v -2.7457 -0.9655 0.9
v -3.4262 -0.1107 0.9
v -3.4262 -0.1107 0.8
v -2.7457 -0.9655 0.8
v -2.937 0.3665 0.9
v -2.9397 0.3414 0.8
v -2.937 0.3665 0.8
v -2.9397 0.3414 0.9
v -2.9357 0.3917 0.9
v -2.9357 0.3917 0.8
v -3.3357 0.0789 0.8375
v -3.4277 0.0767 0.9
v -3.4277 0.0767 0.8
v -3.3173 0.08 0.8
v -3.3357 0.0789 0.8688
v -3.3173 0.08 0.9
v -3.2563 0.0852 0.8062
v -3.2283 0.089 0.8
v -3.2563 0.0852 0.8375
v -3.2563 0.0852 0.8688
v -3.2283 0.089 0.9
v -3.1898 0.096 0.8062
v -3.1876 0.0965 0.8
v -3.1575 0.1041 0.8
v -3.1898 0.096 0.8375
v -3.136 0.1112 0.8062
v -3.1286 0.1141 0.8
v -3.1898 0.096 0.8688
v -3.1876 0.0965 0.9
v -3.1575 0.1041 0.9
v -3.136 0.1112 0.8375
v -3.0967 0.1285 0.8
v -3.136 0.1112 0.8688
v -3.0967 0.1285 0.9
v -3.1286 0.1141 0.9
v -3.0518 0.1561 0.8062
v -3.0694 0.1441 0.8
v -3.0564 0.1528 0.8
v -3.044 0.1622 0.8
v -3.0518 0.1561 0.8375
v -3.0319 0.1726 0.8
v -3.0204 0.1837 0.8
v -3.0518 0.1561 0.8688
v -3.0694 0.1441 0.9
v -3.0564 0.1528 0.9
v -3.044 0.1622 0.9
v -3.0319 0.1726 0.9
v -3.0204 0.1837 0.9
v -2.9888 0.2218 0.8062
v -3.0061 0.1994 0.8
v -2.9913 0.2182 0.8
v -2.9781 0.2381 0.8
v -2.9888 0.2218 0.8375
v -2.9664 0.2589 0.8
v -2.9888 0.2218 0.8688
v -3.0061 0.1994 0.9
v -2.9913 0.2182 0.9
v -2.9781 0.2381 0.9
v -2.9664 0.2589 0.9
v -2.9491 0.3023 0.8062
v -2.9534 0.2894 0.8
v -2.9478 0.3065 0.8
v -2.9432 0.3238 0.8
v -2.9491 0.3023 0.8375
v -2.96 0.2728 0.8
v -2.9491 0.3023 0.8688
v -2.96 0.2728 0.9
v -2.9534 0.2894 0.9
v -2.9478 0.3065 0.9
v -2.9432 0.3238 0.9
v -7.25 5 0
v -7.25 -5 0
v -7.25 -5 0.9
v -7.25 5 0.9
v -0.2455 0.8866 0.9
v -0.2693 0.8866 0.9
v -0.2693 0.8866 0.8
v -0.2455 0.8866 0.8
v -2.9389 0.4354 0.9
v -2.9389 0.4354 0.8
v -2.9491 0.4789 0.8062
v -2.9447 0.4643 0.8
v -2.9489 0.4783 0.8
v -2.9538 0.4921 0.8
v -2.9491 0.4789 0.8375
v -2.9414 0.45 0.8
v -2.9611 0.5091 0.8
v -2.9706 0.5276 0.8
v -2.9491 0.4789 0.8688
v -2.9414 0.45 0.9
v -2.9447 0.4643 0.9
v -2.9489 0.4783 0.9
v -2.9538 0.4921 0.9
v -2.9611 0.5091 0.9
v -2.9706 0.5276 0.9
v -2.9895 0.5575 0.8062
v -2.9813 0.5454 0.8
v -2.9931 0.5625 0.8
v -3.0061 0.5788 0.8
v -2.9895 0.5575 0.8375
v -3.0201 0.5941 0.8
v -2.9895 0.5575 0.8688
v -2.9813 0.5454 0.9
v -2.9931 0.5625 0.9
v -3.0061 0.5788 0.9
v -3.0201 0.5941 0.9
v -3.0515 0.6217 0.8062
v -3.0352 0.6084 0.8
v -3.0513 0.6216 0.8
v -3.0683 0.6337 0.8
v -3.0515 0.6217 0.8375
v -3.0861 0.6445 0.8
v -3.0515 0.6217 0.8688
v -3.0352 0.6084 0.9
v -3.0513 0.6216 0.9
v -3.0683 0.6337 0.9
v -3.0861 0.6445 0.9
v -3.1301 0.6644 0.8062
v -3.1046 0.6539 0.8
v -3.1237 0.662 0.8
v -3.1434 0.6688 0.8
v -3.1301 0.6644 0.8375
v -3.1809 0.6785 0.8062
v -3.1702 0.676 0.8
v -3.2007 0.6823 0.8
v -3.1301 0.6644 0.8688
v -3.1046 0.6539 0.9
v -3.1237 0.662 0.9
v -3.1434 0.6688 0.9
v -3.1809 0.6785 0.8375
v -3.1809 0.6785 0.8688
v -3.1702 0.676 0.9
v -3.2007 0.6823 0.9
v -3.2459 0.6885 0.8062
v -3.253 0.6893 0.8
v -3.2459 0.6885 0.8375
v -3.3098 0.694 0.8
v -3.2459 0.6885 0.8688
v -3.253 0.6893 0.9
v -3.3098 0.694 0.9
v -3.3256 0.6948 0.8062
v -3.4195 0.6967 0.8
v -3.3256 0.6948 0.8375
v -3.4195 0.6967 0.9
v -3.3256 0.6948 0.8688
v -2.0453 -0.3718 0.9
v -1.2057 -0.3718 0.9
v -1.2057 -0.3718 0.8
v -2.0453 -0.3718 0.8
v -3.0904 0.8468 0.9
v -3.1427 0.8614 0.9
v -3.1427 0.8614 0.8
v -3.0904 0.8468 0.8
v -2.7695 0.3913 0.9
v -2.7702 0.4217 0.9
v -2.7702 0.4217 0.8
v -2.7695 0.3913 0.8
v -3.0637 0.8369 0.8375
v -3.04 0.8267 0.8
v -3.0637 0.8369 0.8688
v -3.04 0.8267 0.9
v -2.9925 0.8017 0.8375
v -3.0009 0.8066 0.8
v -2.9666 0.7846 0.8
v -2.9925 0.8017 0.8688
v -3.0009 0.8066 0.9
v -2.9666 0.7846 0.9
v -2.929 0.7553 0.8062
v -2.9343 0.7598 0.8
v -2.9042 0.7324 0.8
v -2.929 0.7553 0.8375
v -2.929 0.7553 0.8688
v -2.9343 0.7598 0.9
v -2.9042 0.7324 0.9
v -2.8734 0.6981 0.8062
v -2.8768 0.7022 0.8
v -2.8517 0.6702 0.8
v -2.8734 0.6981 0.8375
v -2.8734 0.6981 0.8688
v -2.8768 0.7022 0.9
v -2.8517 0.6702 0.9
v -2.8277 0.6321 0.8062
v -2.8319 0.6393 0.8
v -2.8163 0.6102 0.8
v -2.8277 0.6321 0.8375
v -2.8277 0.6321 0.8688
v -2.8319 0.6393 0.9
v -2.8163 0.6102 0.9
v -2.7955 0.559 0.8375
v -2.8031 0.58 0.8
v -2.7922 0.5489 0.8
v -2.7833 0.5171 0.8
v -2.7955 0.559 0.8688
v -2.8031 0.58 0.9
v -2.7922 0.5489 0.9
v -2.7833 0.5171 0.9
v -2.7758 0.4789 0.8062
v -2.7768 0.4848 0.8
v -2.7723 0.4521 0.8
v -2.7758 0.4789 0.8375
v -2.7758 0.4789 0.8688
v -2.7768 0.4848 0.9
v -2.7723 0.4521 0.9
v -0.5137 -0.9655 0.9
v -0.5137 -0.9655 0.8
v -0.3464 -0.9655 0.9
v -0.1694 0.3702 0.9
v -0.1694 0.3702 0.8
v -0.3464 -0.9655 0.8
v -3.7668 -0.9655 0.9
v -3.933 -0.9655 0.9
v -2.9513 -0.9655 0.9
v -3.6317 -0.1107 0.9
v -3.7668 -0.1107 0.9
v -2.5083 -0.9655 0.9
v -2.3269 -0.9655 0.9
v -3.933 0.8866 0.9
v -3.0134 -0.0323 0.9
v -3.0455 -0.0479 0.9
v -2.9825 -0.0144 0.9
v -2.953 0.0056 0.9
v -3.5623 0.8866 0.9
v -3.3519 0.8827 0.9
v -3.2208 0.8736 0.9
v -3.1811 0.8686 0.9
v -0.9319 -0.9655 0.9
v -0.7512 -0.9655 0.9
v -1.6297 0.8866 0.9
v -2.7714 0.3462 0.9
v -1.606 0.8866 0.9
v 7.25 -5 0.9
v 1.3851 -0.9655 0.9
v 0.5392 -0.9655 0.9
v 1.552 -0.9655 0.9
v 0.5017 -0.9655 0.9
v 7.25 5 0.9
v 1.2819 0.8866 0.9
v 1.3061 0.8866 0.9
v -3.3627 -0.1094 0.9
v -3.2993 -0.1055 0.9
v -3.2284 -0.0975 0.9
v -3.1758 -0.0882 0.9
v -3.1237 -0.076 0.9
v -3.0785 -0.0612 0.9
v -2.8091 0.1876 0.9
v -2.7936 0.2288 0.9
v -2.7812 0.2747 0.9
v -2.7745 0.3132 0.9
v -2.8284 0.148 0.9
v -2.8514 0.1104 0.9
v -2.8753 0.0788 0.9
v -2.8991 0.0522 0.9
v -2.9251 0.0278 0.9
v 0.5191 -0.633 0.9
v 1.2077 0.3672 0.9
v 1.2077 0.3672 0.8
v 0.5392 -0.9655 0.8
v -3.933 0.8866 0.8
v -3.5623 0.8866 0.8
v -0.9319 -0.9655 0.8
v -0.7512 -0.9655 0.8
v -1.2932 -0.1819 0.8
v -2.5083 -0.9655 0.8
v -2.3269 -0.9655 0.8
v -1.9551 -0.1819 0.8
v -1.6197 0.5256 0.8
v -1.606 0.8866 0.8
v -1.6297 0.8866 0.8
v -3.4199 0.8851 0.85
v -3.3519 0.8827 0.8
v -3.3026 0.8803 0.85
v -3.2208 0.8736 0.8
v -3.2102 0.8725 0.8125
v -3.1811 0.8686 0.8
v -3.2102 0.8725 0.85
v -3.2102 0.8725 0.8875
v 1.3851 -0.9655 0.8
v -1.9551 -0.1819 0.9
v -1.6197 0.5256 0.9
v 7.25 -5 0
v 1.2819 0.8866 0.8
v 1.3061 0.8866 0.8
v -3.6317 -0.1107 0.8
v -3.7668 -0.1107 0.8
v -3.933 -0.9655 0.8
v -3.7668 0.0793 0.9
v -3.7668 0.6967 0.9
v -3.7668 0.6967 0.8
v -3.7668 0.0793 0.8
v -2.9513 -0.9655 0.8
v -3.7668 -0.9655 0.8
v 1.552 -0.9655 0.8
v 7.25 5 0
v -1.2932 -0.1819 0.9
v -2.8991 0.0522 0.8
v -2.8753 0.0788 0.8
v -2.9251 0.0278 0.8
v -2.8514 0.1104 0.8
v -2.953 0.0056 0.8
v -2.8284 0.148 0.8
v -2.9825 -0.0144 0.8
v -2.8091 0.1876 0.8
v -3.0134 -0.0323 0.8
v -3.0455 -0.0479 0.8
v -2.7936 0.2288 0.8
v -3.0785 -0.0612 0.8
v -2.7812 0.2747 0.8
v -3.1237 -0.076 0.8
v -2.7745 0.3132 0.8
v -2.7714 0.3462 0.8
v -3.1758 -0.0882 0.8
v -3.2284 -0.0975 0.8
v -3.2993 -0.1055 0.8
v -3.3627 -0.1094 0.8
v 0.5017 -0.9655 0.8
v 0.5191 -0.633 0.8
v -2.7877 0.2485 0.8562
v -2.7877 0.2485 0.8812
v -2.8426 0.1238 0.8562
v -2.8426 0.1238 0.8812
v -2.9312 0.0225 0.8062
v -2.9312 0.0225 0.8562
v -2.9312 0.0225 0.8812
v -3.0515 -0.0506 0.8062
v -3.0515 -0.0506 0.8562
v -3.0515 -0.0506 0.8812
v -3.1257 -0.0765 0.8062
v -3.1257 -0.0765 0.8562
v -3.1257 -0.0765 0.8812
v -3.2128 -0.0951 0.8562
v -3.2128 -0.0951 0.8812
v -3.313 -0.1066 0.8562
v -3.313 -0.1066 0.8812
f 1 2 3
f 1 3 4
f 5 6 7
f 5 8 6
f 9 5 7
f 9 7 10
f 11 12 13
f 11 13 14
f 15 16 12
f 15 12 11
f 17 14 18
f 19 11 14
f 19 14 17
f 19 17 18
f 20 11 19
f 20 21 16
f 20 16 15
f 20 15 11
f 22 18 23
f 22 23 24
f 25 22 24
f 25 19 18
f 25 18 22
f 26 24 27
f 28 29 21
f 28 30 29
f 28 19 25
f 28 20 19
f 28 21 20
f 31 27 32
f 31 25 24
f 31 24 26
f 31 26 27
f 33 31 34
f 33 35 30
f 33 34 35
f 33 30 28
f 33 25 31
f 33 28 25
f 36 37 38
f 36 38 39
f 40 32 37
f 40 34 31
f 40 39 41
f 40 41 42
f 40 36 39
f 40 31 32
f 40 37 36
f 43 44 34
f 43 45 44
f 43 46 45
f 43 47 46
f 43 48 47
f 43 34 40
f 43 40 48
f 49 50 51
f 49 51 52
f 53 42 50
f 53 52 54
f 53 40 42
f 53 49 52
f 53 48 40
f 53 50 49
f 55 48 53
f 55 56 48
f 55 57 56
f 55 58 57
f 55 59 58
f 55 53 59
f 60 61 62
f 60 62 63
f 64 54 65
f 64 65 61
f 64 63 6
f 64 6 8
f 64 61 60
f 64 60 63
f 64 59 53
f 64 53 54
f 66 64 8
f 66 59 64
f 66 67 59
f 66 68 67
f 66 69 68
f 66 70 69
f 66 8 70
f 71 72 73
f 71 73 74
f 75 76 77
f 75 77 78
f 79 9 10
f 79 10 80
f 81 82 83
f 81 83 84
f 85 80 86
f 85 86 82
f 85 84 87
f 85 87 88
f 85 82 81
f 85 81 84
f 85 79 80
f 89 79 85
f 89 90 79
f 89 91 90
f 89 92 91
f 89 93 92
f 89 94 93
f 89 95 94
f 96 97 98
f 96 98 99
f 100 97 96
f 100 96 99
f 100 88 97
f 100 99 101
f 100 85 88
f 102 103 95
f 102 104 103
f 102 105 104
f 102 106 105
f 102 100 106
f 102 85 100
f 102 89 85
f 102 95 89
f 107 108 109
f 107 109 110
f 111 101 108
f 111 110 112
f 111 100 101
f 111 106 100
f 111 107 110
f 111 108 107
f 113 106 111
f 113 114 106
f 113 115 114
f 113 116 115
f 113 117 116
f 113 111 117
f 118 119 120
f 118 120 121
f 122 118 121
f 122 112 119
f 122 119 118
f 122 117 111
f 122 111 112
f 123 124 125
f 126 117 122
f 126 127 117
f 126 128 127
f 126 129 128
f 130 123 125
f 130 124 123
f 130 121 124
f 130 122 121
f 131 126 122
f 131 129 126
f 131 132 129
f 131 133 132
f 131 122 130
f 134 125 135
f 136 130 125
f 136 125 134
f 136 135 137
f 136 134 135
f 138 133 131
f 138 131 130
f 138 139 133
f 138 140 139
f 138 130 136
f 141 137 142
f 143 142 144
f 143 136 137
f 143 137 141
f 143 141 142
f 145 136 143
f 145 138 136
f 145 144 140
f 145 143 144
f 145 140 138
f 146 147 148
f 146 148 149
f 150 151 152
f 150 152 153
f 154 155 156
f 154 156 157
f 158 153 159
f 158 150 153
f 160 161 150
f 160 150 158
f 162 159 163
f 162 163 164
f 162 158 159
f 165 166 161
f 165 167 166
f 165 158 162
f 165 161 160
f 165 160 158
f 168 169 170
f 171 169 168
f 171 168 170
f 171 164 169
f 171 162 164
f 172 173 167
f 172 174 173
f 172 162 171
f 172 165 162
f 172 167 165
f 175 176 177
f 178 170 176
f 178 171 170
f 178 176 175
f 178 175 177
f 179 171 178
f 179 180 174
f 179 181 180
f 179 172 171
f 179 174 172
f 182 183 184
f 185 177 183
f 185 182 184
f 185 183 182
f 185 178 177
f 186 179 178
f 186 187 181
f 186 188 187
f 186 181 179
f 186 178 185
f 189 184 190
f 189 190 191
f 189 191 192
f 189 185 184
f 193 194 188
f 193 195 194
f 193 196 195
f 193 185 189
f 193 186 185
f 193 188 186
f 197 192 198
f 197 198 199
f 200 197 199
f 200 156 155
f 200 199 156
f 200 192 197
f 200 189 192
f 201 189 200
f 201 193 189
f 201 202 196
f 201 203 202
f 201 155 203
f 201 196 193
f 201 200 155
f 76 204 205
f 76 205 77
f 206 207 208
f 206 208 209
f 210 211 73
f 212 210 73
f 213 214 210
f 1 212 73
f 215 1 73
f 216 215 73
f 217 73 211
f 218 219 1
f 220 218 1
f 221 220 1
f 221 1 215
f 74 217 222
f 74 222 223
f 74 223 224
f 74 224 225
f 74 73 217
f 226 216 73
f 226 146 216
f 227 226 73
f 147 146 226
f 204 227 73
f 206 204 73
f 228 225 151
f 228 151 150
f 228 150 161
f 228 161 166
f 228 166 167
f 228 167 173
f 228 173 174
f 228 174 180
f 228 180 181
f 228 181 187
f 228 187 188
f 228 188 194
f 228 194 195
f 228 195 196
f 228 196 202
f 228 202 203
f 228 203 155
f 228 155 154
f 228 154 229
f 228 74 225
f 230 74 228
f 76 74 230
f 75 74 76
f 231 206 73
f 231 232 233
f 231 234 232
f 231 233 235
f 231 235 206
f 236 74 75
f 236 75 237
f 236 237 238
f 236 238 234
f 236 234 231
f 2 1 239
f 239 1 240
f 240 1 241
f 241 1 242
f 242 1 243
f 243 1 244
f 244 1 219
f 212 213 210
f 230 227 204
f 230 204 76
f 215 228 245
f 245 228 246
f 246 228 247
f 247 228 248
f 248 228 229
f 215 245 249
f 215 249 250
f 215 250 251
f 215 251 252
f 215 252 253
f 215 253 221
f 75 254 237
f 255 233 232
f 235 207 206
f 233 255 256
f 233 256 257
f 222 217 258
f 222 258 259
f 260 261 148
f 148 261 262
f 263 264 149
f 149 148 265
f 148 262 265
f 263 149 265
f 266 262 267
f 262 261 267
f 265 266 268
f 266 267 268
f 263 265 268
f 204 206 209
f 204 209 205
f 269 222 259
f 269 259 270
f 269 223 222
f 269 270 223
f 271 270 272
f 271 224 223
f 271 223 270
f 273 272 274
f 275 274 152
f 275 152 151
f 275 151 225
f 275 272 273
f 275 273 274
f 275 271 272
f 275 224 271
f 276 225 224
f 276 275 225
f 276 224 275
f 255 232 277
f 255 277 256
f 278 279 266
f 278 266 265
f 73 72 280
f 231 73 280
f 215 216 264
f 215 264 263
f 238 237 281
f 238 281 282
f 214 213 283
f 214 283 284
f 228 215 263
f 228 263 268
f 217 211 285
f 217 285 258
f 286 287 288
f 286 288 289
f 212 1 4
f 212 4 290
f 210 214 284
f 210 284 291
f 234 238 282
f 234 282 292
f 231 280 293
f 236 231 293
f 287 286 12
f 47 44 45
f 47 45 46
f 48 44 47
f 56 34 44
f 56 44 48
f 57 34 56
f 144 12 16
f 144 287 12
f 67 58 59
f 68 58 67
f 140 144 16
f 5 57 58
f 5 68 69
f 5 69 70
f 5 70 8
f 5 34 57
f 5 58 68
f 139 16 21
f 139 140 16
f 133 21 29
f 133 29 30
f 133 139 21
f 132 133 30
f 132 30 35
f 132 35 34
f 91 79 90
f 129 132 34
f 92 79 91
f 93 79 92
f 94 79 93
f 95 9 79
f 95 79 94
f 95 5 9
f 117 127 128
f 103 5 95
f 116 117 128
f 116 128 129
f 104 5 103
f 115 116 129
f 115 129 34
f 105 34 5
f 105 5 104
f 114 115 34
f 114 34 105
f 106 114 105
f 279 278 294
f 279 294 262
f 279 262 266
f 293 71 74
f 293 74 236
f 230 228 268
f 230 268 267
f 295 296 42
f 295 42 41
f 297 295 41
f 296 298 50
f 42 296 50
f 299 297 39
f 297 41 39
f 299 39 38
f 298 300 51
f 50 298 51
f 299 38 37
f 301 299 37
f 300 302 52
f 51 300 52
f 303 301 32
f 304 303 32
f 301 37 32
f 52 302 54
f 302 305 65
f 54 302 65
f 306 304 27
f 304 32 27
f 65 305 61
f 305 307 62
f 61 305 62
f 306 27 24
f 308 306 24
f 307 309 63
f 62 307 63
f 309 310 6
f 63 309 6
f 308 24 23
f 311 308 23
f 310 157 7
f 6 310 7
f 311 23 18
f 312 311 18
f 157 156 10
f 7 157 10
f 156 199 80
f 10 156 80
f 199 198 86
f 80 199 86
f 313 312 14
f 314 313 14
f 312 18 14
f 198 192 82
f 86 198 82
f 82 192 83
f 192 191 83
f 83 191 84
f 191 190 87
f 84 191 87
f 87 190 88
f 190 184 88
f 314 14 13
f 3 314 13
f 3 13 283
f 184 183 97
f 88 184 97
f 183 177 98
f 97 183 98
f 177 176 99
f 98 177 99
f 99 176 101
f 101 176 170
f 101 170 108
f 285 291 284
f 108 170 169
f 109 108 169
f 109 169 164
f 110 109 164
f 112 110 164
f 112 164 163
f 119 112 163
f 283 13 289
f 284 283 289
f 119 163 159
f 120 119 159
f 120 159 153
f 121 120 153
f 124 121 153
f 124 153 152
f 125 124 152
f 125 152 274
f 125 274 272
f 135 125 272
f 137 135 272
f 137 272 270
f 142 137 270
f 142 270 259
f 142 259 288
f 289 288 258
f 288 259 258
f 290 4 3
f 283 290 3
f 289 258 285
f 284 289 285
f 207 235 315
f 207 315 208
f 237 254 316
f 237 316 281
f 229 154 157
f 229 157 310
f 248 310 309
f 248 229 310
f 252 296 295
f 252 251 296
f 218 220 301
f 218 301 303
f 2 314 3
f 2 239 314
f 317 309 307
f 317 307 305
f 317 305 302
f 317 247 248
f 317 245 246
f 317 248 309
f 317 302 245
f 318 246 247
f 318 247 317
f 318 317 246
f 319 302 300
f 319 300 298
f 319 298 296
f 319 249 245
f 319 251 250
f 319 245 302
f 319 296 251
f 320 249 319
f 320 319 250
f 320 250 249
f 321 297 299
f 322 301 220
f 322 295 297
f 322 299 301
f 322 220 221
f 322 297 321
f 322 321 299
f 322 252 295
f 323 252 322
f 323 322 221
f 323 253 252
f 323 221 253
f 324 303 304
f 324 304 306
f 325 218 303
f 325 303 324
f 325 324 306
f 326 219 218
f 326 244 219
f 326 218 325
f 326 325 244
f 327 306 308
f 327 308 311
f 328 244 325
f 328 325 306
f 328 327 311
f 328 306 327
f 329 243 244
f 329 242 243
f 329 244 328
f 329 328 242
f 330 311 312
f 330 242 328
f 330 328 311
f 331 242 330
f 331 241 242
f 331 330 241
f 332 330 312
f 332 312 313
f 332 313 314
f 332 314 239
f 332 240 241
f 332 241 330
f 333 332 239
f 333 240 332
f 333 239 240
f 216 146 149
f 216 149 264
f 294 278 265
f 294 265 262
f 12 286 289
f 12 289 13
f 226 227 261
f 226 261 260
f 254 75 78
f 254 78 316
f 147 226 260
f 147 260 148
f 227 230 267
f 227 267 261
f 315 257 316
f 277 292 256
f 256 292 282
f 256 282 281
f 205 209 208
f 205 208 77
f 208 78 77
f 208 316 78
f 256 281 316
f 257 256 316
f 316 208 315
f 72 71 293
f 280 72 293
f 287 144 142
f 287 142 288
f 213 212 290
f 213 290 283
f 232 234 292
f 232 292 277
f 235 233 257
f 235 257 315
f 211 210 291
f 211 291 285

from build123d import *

# Parameters (mm, degrees)
ESQUISSE1_W             = 14.5
ESQUISSE1_H             = 10
BOSS_EXTRU_1_DEPTH      = 0.9
ENL_V_MAT_EXTRU_1_DEPTH = 0.1


with BuildPart() as part:
    # Esquisse1 → Boss.-Extru.1 (new body)
    with BuildSketch(Plane.XY):
        Rectangle(ESQUISSE1_W, ESQUISSE1_H)
    extrude(amount=BOSS_EXTRU_1_DEPTH)

    # Esquisse2 → Enlèv. mat.-Extru.1 (cut)
    # profile 1 of 3: a face of its own
    with BuildSketch(Plane.XY.offset(0.9)):
        with BuildLine():
            Line((-3.93297689, 0.88662019), (-3.562337617, 0.88662019))
            add(Edge.make_bspline(
                [(-3.562337617, 0.88662019), (-3.53760377, 0.886537859), (-3.490112043, 0.886379775), (-3.422075354, 0.885498308), (-3.360254349, 0.882971879), (-3.304681351, 0.880797753), (-3.255357379, 0.876833268), (-3.212131188, 0.873044092), (-3.175201864, 0.868083863), (-3.152846768, 0.863477243), (-3.142724987, 0.861391491)],
                knots=[0, 0, 0, 0, 1.410062039, 2.707475311, 3.878576406, 4.937260626, 5.877586885, 6.699081471, 7.410979367, 8, 8, 8, 8], degree=3))
            add(Edge.make_bspline(
                [(-3.142724987, 0.861391491), (-3.129174815, 0.858043577), (-3.102363533, 0.851419171), (-3.06376079, 0.837417632), (-3.026976127, 0.821214747), (-2.992162344, 0.802183945), (-2.959493822, 0.780183958), (-2.928633716, 0.755594576), (-2.899441991, 0.728550347), (-2.873099212, 0.69836941), (-2.84826063, 0.666705923), (-2.827311649, 0.632466852), (-2.809253053, 0.596662627), (-2.794875321, 0.558929118), (-2.783298227, 0.519632264), (-2.775135175, 0.478416109), (-2.770239755, 0.435468427), (-2.769741357, 0.406174867), (-2.769488642, 0.391321462)],
                knots=[0, 0, 0, 0, 1.027469482, 2.033020251, 3.019912614, 3.986113645, 4.951240523, 5.91722682, 6.890402269, 7.87763091, 8.8651537, 9.85103654, 10.82876324, 11.815024772, 12.821070561, 13.842952187, 14.906261191, 16, 16, 16, 16], degree=3))
            add(Edge.make_bspline(
                [(-2.769488642, 0.391321462), (-2.770265987, 0.366643719), (-2.771782788, 0.318491051), (-2.785924822, 0.248608835), (-2.809089897, 0.183421156), (-2.841010971, 0.123010093), (-2.881661277, 0.06855321), (-2.930516479, 0.020721594), (-2.987603831, -0.019304526), (-3.040747678, -0.047060802), (-3.087692275, -0.06483705), (-3.12633907, -0.077344623), (-3.168496179, -0.087008246), (-3.213759685, -0.095665482), (-3.262317953, -0.102201587), (-3.314054598, -0.106988744), (-3.36900652, -0.109980678), (-3.406756778, -0.110426239), (-3.426176843, -0.110655451)],
                knots=[0, 0, 0, 0, 1.260483769, 2.459530307, 3.627416485, 4.787058657, 5.939039949, 7.08810263, 8.267026773, 9.491475466, 10.141966685, 10.831826277, 11.566392101, 12.351337768, 13.187381173, 14.07005841, 15.007169909, 16, 16, 16, 16], degree=3))
            Line((-3.426176843, -0.110655451), (-2.745743984, -0.965463143))
            Line((-2.745743984, -0.965463143), (-2.951283681, -0.965463143))
            Line((-2.951283681, -0.965463143), (-3.63171654, -0.110655451))
            Line((-3.63171654, -0.110655451), (-3.766764283, -0.110655451))
            Line((-3.766764283, -0.110655451), (-3.766764283, -0.965463143))
            Line((-3.766764283, -0.965463143), (-3.93297689, -0.965463143))
            Line((-3.93297689, -0.965463143), (-3.93297689, 0.88662019))
        make_face()
        with BuildLine():
            Line((-3.766764283, 0.696662925), (-3.766764283, 0.079301814))
            Line((-3.766764283, 0.079301814), (-3.427660884, 0.076704742))
            add(Edge.make_bspline(
                [(-3.427660884, 0.076704742), (-3.411828197, 0.076697738), (-3.38113994, 0.076684161), (-3.336742505, 0.078797534), (-3.295403945, 0.081201707), (-3.257282381, 0.084879069), (-3.22236078, 0.089618324), (-3.190656599, 0.095546569), (-3.162118084, 0.102453286), (-3.128834274, 0.113143313), (-3.091667443, 0.130079831), (-3.051275379, 0.154720741), (-3.016878309, 0.185713566), (-2.987817607, 0.221153687), (-2.964465782, 0.260119535), (-2.94800232, 0.30214403), (-2.937555278, 0.346166251), (-2.936323089, 0.376423), (-2.935701249, 0.391692472)],
                knots=[0, 0, 0, 0, 1.146690395, 2.22261258, 3.21895312, 4.145990853, 4.996080663, 5.770904154, 6.481378293, 7.121626537, 8.300444488, 9.431385265, 10.535395872, 11.636531494, 12.74115979, 13.810798291, 14.895190096, 16, 16, 16, 16], degree=3))
            add(Edge.make_bspline(
                [(-2.935701249, 0.391692472), (-2.936337371, 0.406586701), (-2.937597934, 0.436101627), (-2.947889574, 0.479311213), (-2.965293538, 0.520092474), (-2.988747389, 0.558279514), (-3.017321942, 0.592942966), (-3.050827618, 0.622601251), (-3.088348283, 0.647074926), (-3.123416793, 0.662714119), (-3.154761563, 0.672302542), (-3.181976425, 0.679050033), (-3.212727082, 0.684471064), (-3.247162846, 0.688814496), (-3.285136709, 0.692547738), (-3.326840678, 0.69506222), (-3.371998058, 0.696551224), (-3.403296642, 0.696624825), (-3.419498658, 0.696662925)],
                knots=[0, 0, 0, 0, 1.101028733, 2.181837193, 3.264309656, 4.369019818, 5.486613113, 6.575447106, 7.666700264, 8.788928104, 9.402425223, 10.0903467, 10.862060571, 11.710948788, 12.657782767, 13.684531032, 14.801375019, 16, 16, 16, 16], degree=3))
            Line((-3.419498658, 0.696662925), (-3.766764283, 0.696662925))
        make_face(mode=Mode.SUBTRACT)
    # profile 2 of 3: a face of its own
    with BuildSketch(Plane.XY.offset(0.9)):
        Polygon((-1.606000394, 0.88662019), (-0.751192702, -0.965463143), (-0.93187471, -0.965463143), (-1.205680299, -0.37184669), (-2.045276569, -0.37184669), (-2.326873374, -0.965463143), (-2.508297403, -0.965463143), (-1.629745052, 0.88662019), align=None)
        Polygon((-1.619727775, 0.525627185), (-1.955121071, -0.181889425), (-1.293238725, -0.181889425), align=None, mode=Mode.SUBTRACT)
    # profile 3 of 3: a face of its own
    with BuildSketch(Plane.XY.offset(0.9)):
        Polygon((-0.513746121, -0.965463143), (-0.269250344, 0.88662019), (-0.245505686, 0.88662019), (0.519146508, -0.63303793), (1.28194365, 0.88662019), (1.306059318, 0.88662019), (1.552039136, -0.965463143), (1.385084508, -0.965463143), (1.207741593, 0.367205794), (0.539181063, -0.965463143), (0.501709024, -0.965463143), (-0.169448578, 0.370173876), (-0.346420483, -0.965463143), align=None)
    extrude(amount=-ENL_V_MAT_EXTRU_1_DEPTH, mode=Mode.SUBTRACT)


solid = part.part
